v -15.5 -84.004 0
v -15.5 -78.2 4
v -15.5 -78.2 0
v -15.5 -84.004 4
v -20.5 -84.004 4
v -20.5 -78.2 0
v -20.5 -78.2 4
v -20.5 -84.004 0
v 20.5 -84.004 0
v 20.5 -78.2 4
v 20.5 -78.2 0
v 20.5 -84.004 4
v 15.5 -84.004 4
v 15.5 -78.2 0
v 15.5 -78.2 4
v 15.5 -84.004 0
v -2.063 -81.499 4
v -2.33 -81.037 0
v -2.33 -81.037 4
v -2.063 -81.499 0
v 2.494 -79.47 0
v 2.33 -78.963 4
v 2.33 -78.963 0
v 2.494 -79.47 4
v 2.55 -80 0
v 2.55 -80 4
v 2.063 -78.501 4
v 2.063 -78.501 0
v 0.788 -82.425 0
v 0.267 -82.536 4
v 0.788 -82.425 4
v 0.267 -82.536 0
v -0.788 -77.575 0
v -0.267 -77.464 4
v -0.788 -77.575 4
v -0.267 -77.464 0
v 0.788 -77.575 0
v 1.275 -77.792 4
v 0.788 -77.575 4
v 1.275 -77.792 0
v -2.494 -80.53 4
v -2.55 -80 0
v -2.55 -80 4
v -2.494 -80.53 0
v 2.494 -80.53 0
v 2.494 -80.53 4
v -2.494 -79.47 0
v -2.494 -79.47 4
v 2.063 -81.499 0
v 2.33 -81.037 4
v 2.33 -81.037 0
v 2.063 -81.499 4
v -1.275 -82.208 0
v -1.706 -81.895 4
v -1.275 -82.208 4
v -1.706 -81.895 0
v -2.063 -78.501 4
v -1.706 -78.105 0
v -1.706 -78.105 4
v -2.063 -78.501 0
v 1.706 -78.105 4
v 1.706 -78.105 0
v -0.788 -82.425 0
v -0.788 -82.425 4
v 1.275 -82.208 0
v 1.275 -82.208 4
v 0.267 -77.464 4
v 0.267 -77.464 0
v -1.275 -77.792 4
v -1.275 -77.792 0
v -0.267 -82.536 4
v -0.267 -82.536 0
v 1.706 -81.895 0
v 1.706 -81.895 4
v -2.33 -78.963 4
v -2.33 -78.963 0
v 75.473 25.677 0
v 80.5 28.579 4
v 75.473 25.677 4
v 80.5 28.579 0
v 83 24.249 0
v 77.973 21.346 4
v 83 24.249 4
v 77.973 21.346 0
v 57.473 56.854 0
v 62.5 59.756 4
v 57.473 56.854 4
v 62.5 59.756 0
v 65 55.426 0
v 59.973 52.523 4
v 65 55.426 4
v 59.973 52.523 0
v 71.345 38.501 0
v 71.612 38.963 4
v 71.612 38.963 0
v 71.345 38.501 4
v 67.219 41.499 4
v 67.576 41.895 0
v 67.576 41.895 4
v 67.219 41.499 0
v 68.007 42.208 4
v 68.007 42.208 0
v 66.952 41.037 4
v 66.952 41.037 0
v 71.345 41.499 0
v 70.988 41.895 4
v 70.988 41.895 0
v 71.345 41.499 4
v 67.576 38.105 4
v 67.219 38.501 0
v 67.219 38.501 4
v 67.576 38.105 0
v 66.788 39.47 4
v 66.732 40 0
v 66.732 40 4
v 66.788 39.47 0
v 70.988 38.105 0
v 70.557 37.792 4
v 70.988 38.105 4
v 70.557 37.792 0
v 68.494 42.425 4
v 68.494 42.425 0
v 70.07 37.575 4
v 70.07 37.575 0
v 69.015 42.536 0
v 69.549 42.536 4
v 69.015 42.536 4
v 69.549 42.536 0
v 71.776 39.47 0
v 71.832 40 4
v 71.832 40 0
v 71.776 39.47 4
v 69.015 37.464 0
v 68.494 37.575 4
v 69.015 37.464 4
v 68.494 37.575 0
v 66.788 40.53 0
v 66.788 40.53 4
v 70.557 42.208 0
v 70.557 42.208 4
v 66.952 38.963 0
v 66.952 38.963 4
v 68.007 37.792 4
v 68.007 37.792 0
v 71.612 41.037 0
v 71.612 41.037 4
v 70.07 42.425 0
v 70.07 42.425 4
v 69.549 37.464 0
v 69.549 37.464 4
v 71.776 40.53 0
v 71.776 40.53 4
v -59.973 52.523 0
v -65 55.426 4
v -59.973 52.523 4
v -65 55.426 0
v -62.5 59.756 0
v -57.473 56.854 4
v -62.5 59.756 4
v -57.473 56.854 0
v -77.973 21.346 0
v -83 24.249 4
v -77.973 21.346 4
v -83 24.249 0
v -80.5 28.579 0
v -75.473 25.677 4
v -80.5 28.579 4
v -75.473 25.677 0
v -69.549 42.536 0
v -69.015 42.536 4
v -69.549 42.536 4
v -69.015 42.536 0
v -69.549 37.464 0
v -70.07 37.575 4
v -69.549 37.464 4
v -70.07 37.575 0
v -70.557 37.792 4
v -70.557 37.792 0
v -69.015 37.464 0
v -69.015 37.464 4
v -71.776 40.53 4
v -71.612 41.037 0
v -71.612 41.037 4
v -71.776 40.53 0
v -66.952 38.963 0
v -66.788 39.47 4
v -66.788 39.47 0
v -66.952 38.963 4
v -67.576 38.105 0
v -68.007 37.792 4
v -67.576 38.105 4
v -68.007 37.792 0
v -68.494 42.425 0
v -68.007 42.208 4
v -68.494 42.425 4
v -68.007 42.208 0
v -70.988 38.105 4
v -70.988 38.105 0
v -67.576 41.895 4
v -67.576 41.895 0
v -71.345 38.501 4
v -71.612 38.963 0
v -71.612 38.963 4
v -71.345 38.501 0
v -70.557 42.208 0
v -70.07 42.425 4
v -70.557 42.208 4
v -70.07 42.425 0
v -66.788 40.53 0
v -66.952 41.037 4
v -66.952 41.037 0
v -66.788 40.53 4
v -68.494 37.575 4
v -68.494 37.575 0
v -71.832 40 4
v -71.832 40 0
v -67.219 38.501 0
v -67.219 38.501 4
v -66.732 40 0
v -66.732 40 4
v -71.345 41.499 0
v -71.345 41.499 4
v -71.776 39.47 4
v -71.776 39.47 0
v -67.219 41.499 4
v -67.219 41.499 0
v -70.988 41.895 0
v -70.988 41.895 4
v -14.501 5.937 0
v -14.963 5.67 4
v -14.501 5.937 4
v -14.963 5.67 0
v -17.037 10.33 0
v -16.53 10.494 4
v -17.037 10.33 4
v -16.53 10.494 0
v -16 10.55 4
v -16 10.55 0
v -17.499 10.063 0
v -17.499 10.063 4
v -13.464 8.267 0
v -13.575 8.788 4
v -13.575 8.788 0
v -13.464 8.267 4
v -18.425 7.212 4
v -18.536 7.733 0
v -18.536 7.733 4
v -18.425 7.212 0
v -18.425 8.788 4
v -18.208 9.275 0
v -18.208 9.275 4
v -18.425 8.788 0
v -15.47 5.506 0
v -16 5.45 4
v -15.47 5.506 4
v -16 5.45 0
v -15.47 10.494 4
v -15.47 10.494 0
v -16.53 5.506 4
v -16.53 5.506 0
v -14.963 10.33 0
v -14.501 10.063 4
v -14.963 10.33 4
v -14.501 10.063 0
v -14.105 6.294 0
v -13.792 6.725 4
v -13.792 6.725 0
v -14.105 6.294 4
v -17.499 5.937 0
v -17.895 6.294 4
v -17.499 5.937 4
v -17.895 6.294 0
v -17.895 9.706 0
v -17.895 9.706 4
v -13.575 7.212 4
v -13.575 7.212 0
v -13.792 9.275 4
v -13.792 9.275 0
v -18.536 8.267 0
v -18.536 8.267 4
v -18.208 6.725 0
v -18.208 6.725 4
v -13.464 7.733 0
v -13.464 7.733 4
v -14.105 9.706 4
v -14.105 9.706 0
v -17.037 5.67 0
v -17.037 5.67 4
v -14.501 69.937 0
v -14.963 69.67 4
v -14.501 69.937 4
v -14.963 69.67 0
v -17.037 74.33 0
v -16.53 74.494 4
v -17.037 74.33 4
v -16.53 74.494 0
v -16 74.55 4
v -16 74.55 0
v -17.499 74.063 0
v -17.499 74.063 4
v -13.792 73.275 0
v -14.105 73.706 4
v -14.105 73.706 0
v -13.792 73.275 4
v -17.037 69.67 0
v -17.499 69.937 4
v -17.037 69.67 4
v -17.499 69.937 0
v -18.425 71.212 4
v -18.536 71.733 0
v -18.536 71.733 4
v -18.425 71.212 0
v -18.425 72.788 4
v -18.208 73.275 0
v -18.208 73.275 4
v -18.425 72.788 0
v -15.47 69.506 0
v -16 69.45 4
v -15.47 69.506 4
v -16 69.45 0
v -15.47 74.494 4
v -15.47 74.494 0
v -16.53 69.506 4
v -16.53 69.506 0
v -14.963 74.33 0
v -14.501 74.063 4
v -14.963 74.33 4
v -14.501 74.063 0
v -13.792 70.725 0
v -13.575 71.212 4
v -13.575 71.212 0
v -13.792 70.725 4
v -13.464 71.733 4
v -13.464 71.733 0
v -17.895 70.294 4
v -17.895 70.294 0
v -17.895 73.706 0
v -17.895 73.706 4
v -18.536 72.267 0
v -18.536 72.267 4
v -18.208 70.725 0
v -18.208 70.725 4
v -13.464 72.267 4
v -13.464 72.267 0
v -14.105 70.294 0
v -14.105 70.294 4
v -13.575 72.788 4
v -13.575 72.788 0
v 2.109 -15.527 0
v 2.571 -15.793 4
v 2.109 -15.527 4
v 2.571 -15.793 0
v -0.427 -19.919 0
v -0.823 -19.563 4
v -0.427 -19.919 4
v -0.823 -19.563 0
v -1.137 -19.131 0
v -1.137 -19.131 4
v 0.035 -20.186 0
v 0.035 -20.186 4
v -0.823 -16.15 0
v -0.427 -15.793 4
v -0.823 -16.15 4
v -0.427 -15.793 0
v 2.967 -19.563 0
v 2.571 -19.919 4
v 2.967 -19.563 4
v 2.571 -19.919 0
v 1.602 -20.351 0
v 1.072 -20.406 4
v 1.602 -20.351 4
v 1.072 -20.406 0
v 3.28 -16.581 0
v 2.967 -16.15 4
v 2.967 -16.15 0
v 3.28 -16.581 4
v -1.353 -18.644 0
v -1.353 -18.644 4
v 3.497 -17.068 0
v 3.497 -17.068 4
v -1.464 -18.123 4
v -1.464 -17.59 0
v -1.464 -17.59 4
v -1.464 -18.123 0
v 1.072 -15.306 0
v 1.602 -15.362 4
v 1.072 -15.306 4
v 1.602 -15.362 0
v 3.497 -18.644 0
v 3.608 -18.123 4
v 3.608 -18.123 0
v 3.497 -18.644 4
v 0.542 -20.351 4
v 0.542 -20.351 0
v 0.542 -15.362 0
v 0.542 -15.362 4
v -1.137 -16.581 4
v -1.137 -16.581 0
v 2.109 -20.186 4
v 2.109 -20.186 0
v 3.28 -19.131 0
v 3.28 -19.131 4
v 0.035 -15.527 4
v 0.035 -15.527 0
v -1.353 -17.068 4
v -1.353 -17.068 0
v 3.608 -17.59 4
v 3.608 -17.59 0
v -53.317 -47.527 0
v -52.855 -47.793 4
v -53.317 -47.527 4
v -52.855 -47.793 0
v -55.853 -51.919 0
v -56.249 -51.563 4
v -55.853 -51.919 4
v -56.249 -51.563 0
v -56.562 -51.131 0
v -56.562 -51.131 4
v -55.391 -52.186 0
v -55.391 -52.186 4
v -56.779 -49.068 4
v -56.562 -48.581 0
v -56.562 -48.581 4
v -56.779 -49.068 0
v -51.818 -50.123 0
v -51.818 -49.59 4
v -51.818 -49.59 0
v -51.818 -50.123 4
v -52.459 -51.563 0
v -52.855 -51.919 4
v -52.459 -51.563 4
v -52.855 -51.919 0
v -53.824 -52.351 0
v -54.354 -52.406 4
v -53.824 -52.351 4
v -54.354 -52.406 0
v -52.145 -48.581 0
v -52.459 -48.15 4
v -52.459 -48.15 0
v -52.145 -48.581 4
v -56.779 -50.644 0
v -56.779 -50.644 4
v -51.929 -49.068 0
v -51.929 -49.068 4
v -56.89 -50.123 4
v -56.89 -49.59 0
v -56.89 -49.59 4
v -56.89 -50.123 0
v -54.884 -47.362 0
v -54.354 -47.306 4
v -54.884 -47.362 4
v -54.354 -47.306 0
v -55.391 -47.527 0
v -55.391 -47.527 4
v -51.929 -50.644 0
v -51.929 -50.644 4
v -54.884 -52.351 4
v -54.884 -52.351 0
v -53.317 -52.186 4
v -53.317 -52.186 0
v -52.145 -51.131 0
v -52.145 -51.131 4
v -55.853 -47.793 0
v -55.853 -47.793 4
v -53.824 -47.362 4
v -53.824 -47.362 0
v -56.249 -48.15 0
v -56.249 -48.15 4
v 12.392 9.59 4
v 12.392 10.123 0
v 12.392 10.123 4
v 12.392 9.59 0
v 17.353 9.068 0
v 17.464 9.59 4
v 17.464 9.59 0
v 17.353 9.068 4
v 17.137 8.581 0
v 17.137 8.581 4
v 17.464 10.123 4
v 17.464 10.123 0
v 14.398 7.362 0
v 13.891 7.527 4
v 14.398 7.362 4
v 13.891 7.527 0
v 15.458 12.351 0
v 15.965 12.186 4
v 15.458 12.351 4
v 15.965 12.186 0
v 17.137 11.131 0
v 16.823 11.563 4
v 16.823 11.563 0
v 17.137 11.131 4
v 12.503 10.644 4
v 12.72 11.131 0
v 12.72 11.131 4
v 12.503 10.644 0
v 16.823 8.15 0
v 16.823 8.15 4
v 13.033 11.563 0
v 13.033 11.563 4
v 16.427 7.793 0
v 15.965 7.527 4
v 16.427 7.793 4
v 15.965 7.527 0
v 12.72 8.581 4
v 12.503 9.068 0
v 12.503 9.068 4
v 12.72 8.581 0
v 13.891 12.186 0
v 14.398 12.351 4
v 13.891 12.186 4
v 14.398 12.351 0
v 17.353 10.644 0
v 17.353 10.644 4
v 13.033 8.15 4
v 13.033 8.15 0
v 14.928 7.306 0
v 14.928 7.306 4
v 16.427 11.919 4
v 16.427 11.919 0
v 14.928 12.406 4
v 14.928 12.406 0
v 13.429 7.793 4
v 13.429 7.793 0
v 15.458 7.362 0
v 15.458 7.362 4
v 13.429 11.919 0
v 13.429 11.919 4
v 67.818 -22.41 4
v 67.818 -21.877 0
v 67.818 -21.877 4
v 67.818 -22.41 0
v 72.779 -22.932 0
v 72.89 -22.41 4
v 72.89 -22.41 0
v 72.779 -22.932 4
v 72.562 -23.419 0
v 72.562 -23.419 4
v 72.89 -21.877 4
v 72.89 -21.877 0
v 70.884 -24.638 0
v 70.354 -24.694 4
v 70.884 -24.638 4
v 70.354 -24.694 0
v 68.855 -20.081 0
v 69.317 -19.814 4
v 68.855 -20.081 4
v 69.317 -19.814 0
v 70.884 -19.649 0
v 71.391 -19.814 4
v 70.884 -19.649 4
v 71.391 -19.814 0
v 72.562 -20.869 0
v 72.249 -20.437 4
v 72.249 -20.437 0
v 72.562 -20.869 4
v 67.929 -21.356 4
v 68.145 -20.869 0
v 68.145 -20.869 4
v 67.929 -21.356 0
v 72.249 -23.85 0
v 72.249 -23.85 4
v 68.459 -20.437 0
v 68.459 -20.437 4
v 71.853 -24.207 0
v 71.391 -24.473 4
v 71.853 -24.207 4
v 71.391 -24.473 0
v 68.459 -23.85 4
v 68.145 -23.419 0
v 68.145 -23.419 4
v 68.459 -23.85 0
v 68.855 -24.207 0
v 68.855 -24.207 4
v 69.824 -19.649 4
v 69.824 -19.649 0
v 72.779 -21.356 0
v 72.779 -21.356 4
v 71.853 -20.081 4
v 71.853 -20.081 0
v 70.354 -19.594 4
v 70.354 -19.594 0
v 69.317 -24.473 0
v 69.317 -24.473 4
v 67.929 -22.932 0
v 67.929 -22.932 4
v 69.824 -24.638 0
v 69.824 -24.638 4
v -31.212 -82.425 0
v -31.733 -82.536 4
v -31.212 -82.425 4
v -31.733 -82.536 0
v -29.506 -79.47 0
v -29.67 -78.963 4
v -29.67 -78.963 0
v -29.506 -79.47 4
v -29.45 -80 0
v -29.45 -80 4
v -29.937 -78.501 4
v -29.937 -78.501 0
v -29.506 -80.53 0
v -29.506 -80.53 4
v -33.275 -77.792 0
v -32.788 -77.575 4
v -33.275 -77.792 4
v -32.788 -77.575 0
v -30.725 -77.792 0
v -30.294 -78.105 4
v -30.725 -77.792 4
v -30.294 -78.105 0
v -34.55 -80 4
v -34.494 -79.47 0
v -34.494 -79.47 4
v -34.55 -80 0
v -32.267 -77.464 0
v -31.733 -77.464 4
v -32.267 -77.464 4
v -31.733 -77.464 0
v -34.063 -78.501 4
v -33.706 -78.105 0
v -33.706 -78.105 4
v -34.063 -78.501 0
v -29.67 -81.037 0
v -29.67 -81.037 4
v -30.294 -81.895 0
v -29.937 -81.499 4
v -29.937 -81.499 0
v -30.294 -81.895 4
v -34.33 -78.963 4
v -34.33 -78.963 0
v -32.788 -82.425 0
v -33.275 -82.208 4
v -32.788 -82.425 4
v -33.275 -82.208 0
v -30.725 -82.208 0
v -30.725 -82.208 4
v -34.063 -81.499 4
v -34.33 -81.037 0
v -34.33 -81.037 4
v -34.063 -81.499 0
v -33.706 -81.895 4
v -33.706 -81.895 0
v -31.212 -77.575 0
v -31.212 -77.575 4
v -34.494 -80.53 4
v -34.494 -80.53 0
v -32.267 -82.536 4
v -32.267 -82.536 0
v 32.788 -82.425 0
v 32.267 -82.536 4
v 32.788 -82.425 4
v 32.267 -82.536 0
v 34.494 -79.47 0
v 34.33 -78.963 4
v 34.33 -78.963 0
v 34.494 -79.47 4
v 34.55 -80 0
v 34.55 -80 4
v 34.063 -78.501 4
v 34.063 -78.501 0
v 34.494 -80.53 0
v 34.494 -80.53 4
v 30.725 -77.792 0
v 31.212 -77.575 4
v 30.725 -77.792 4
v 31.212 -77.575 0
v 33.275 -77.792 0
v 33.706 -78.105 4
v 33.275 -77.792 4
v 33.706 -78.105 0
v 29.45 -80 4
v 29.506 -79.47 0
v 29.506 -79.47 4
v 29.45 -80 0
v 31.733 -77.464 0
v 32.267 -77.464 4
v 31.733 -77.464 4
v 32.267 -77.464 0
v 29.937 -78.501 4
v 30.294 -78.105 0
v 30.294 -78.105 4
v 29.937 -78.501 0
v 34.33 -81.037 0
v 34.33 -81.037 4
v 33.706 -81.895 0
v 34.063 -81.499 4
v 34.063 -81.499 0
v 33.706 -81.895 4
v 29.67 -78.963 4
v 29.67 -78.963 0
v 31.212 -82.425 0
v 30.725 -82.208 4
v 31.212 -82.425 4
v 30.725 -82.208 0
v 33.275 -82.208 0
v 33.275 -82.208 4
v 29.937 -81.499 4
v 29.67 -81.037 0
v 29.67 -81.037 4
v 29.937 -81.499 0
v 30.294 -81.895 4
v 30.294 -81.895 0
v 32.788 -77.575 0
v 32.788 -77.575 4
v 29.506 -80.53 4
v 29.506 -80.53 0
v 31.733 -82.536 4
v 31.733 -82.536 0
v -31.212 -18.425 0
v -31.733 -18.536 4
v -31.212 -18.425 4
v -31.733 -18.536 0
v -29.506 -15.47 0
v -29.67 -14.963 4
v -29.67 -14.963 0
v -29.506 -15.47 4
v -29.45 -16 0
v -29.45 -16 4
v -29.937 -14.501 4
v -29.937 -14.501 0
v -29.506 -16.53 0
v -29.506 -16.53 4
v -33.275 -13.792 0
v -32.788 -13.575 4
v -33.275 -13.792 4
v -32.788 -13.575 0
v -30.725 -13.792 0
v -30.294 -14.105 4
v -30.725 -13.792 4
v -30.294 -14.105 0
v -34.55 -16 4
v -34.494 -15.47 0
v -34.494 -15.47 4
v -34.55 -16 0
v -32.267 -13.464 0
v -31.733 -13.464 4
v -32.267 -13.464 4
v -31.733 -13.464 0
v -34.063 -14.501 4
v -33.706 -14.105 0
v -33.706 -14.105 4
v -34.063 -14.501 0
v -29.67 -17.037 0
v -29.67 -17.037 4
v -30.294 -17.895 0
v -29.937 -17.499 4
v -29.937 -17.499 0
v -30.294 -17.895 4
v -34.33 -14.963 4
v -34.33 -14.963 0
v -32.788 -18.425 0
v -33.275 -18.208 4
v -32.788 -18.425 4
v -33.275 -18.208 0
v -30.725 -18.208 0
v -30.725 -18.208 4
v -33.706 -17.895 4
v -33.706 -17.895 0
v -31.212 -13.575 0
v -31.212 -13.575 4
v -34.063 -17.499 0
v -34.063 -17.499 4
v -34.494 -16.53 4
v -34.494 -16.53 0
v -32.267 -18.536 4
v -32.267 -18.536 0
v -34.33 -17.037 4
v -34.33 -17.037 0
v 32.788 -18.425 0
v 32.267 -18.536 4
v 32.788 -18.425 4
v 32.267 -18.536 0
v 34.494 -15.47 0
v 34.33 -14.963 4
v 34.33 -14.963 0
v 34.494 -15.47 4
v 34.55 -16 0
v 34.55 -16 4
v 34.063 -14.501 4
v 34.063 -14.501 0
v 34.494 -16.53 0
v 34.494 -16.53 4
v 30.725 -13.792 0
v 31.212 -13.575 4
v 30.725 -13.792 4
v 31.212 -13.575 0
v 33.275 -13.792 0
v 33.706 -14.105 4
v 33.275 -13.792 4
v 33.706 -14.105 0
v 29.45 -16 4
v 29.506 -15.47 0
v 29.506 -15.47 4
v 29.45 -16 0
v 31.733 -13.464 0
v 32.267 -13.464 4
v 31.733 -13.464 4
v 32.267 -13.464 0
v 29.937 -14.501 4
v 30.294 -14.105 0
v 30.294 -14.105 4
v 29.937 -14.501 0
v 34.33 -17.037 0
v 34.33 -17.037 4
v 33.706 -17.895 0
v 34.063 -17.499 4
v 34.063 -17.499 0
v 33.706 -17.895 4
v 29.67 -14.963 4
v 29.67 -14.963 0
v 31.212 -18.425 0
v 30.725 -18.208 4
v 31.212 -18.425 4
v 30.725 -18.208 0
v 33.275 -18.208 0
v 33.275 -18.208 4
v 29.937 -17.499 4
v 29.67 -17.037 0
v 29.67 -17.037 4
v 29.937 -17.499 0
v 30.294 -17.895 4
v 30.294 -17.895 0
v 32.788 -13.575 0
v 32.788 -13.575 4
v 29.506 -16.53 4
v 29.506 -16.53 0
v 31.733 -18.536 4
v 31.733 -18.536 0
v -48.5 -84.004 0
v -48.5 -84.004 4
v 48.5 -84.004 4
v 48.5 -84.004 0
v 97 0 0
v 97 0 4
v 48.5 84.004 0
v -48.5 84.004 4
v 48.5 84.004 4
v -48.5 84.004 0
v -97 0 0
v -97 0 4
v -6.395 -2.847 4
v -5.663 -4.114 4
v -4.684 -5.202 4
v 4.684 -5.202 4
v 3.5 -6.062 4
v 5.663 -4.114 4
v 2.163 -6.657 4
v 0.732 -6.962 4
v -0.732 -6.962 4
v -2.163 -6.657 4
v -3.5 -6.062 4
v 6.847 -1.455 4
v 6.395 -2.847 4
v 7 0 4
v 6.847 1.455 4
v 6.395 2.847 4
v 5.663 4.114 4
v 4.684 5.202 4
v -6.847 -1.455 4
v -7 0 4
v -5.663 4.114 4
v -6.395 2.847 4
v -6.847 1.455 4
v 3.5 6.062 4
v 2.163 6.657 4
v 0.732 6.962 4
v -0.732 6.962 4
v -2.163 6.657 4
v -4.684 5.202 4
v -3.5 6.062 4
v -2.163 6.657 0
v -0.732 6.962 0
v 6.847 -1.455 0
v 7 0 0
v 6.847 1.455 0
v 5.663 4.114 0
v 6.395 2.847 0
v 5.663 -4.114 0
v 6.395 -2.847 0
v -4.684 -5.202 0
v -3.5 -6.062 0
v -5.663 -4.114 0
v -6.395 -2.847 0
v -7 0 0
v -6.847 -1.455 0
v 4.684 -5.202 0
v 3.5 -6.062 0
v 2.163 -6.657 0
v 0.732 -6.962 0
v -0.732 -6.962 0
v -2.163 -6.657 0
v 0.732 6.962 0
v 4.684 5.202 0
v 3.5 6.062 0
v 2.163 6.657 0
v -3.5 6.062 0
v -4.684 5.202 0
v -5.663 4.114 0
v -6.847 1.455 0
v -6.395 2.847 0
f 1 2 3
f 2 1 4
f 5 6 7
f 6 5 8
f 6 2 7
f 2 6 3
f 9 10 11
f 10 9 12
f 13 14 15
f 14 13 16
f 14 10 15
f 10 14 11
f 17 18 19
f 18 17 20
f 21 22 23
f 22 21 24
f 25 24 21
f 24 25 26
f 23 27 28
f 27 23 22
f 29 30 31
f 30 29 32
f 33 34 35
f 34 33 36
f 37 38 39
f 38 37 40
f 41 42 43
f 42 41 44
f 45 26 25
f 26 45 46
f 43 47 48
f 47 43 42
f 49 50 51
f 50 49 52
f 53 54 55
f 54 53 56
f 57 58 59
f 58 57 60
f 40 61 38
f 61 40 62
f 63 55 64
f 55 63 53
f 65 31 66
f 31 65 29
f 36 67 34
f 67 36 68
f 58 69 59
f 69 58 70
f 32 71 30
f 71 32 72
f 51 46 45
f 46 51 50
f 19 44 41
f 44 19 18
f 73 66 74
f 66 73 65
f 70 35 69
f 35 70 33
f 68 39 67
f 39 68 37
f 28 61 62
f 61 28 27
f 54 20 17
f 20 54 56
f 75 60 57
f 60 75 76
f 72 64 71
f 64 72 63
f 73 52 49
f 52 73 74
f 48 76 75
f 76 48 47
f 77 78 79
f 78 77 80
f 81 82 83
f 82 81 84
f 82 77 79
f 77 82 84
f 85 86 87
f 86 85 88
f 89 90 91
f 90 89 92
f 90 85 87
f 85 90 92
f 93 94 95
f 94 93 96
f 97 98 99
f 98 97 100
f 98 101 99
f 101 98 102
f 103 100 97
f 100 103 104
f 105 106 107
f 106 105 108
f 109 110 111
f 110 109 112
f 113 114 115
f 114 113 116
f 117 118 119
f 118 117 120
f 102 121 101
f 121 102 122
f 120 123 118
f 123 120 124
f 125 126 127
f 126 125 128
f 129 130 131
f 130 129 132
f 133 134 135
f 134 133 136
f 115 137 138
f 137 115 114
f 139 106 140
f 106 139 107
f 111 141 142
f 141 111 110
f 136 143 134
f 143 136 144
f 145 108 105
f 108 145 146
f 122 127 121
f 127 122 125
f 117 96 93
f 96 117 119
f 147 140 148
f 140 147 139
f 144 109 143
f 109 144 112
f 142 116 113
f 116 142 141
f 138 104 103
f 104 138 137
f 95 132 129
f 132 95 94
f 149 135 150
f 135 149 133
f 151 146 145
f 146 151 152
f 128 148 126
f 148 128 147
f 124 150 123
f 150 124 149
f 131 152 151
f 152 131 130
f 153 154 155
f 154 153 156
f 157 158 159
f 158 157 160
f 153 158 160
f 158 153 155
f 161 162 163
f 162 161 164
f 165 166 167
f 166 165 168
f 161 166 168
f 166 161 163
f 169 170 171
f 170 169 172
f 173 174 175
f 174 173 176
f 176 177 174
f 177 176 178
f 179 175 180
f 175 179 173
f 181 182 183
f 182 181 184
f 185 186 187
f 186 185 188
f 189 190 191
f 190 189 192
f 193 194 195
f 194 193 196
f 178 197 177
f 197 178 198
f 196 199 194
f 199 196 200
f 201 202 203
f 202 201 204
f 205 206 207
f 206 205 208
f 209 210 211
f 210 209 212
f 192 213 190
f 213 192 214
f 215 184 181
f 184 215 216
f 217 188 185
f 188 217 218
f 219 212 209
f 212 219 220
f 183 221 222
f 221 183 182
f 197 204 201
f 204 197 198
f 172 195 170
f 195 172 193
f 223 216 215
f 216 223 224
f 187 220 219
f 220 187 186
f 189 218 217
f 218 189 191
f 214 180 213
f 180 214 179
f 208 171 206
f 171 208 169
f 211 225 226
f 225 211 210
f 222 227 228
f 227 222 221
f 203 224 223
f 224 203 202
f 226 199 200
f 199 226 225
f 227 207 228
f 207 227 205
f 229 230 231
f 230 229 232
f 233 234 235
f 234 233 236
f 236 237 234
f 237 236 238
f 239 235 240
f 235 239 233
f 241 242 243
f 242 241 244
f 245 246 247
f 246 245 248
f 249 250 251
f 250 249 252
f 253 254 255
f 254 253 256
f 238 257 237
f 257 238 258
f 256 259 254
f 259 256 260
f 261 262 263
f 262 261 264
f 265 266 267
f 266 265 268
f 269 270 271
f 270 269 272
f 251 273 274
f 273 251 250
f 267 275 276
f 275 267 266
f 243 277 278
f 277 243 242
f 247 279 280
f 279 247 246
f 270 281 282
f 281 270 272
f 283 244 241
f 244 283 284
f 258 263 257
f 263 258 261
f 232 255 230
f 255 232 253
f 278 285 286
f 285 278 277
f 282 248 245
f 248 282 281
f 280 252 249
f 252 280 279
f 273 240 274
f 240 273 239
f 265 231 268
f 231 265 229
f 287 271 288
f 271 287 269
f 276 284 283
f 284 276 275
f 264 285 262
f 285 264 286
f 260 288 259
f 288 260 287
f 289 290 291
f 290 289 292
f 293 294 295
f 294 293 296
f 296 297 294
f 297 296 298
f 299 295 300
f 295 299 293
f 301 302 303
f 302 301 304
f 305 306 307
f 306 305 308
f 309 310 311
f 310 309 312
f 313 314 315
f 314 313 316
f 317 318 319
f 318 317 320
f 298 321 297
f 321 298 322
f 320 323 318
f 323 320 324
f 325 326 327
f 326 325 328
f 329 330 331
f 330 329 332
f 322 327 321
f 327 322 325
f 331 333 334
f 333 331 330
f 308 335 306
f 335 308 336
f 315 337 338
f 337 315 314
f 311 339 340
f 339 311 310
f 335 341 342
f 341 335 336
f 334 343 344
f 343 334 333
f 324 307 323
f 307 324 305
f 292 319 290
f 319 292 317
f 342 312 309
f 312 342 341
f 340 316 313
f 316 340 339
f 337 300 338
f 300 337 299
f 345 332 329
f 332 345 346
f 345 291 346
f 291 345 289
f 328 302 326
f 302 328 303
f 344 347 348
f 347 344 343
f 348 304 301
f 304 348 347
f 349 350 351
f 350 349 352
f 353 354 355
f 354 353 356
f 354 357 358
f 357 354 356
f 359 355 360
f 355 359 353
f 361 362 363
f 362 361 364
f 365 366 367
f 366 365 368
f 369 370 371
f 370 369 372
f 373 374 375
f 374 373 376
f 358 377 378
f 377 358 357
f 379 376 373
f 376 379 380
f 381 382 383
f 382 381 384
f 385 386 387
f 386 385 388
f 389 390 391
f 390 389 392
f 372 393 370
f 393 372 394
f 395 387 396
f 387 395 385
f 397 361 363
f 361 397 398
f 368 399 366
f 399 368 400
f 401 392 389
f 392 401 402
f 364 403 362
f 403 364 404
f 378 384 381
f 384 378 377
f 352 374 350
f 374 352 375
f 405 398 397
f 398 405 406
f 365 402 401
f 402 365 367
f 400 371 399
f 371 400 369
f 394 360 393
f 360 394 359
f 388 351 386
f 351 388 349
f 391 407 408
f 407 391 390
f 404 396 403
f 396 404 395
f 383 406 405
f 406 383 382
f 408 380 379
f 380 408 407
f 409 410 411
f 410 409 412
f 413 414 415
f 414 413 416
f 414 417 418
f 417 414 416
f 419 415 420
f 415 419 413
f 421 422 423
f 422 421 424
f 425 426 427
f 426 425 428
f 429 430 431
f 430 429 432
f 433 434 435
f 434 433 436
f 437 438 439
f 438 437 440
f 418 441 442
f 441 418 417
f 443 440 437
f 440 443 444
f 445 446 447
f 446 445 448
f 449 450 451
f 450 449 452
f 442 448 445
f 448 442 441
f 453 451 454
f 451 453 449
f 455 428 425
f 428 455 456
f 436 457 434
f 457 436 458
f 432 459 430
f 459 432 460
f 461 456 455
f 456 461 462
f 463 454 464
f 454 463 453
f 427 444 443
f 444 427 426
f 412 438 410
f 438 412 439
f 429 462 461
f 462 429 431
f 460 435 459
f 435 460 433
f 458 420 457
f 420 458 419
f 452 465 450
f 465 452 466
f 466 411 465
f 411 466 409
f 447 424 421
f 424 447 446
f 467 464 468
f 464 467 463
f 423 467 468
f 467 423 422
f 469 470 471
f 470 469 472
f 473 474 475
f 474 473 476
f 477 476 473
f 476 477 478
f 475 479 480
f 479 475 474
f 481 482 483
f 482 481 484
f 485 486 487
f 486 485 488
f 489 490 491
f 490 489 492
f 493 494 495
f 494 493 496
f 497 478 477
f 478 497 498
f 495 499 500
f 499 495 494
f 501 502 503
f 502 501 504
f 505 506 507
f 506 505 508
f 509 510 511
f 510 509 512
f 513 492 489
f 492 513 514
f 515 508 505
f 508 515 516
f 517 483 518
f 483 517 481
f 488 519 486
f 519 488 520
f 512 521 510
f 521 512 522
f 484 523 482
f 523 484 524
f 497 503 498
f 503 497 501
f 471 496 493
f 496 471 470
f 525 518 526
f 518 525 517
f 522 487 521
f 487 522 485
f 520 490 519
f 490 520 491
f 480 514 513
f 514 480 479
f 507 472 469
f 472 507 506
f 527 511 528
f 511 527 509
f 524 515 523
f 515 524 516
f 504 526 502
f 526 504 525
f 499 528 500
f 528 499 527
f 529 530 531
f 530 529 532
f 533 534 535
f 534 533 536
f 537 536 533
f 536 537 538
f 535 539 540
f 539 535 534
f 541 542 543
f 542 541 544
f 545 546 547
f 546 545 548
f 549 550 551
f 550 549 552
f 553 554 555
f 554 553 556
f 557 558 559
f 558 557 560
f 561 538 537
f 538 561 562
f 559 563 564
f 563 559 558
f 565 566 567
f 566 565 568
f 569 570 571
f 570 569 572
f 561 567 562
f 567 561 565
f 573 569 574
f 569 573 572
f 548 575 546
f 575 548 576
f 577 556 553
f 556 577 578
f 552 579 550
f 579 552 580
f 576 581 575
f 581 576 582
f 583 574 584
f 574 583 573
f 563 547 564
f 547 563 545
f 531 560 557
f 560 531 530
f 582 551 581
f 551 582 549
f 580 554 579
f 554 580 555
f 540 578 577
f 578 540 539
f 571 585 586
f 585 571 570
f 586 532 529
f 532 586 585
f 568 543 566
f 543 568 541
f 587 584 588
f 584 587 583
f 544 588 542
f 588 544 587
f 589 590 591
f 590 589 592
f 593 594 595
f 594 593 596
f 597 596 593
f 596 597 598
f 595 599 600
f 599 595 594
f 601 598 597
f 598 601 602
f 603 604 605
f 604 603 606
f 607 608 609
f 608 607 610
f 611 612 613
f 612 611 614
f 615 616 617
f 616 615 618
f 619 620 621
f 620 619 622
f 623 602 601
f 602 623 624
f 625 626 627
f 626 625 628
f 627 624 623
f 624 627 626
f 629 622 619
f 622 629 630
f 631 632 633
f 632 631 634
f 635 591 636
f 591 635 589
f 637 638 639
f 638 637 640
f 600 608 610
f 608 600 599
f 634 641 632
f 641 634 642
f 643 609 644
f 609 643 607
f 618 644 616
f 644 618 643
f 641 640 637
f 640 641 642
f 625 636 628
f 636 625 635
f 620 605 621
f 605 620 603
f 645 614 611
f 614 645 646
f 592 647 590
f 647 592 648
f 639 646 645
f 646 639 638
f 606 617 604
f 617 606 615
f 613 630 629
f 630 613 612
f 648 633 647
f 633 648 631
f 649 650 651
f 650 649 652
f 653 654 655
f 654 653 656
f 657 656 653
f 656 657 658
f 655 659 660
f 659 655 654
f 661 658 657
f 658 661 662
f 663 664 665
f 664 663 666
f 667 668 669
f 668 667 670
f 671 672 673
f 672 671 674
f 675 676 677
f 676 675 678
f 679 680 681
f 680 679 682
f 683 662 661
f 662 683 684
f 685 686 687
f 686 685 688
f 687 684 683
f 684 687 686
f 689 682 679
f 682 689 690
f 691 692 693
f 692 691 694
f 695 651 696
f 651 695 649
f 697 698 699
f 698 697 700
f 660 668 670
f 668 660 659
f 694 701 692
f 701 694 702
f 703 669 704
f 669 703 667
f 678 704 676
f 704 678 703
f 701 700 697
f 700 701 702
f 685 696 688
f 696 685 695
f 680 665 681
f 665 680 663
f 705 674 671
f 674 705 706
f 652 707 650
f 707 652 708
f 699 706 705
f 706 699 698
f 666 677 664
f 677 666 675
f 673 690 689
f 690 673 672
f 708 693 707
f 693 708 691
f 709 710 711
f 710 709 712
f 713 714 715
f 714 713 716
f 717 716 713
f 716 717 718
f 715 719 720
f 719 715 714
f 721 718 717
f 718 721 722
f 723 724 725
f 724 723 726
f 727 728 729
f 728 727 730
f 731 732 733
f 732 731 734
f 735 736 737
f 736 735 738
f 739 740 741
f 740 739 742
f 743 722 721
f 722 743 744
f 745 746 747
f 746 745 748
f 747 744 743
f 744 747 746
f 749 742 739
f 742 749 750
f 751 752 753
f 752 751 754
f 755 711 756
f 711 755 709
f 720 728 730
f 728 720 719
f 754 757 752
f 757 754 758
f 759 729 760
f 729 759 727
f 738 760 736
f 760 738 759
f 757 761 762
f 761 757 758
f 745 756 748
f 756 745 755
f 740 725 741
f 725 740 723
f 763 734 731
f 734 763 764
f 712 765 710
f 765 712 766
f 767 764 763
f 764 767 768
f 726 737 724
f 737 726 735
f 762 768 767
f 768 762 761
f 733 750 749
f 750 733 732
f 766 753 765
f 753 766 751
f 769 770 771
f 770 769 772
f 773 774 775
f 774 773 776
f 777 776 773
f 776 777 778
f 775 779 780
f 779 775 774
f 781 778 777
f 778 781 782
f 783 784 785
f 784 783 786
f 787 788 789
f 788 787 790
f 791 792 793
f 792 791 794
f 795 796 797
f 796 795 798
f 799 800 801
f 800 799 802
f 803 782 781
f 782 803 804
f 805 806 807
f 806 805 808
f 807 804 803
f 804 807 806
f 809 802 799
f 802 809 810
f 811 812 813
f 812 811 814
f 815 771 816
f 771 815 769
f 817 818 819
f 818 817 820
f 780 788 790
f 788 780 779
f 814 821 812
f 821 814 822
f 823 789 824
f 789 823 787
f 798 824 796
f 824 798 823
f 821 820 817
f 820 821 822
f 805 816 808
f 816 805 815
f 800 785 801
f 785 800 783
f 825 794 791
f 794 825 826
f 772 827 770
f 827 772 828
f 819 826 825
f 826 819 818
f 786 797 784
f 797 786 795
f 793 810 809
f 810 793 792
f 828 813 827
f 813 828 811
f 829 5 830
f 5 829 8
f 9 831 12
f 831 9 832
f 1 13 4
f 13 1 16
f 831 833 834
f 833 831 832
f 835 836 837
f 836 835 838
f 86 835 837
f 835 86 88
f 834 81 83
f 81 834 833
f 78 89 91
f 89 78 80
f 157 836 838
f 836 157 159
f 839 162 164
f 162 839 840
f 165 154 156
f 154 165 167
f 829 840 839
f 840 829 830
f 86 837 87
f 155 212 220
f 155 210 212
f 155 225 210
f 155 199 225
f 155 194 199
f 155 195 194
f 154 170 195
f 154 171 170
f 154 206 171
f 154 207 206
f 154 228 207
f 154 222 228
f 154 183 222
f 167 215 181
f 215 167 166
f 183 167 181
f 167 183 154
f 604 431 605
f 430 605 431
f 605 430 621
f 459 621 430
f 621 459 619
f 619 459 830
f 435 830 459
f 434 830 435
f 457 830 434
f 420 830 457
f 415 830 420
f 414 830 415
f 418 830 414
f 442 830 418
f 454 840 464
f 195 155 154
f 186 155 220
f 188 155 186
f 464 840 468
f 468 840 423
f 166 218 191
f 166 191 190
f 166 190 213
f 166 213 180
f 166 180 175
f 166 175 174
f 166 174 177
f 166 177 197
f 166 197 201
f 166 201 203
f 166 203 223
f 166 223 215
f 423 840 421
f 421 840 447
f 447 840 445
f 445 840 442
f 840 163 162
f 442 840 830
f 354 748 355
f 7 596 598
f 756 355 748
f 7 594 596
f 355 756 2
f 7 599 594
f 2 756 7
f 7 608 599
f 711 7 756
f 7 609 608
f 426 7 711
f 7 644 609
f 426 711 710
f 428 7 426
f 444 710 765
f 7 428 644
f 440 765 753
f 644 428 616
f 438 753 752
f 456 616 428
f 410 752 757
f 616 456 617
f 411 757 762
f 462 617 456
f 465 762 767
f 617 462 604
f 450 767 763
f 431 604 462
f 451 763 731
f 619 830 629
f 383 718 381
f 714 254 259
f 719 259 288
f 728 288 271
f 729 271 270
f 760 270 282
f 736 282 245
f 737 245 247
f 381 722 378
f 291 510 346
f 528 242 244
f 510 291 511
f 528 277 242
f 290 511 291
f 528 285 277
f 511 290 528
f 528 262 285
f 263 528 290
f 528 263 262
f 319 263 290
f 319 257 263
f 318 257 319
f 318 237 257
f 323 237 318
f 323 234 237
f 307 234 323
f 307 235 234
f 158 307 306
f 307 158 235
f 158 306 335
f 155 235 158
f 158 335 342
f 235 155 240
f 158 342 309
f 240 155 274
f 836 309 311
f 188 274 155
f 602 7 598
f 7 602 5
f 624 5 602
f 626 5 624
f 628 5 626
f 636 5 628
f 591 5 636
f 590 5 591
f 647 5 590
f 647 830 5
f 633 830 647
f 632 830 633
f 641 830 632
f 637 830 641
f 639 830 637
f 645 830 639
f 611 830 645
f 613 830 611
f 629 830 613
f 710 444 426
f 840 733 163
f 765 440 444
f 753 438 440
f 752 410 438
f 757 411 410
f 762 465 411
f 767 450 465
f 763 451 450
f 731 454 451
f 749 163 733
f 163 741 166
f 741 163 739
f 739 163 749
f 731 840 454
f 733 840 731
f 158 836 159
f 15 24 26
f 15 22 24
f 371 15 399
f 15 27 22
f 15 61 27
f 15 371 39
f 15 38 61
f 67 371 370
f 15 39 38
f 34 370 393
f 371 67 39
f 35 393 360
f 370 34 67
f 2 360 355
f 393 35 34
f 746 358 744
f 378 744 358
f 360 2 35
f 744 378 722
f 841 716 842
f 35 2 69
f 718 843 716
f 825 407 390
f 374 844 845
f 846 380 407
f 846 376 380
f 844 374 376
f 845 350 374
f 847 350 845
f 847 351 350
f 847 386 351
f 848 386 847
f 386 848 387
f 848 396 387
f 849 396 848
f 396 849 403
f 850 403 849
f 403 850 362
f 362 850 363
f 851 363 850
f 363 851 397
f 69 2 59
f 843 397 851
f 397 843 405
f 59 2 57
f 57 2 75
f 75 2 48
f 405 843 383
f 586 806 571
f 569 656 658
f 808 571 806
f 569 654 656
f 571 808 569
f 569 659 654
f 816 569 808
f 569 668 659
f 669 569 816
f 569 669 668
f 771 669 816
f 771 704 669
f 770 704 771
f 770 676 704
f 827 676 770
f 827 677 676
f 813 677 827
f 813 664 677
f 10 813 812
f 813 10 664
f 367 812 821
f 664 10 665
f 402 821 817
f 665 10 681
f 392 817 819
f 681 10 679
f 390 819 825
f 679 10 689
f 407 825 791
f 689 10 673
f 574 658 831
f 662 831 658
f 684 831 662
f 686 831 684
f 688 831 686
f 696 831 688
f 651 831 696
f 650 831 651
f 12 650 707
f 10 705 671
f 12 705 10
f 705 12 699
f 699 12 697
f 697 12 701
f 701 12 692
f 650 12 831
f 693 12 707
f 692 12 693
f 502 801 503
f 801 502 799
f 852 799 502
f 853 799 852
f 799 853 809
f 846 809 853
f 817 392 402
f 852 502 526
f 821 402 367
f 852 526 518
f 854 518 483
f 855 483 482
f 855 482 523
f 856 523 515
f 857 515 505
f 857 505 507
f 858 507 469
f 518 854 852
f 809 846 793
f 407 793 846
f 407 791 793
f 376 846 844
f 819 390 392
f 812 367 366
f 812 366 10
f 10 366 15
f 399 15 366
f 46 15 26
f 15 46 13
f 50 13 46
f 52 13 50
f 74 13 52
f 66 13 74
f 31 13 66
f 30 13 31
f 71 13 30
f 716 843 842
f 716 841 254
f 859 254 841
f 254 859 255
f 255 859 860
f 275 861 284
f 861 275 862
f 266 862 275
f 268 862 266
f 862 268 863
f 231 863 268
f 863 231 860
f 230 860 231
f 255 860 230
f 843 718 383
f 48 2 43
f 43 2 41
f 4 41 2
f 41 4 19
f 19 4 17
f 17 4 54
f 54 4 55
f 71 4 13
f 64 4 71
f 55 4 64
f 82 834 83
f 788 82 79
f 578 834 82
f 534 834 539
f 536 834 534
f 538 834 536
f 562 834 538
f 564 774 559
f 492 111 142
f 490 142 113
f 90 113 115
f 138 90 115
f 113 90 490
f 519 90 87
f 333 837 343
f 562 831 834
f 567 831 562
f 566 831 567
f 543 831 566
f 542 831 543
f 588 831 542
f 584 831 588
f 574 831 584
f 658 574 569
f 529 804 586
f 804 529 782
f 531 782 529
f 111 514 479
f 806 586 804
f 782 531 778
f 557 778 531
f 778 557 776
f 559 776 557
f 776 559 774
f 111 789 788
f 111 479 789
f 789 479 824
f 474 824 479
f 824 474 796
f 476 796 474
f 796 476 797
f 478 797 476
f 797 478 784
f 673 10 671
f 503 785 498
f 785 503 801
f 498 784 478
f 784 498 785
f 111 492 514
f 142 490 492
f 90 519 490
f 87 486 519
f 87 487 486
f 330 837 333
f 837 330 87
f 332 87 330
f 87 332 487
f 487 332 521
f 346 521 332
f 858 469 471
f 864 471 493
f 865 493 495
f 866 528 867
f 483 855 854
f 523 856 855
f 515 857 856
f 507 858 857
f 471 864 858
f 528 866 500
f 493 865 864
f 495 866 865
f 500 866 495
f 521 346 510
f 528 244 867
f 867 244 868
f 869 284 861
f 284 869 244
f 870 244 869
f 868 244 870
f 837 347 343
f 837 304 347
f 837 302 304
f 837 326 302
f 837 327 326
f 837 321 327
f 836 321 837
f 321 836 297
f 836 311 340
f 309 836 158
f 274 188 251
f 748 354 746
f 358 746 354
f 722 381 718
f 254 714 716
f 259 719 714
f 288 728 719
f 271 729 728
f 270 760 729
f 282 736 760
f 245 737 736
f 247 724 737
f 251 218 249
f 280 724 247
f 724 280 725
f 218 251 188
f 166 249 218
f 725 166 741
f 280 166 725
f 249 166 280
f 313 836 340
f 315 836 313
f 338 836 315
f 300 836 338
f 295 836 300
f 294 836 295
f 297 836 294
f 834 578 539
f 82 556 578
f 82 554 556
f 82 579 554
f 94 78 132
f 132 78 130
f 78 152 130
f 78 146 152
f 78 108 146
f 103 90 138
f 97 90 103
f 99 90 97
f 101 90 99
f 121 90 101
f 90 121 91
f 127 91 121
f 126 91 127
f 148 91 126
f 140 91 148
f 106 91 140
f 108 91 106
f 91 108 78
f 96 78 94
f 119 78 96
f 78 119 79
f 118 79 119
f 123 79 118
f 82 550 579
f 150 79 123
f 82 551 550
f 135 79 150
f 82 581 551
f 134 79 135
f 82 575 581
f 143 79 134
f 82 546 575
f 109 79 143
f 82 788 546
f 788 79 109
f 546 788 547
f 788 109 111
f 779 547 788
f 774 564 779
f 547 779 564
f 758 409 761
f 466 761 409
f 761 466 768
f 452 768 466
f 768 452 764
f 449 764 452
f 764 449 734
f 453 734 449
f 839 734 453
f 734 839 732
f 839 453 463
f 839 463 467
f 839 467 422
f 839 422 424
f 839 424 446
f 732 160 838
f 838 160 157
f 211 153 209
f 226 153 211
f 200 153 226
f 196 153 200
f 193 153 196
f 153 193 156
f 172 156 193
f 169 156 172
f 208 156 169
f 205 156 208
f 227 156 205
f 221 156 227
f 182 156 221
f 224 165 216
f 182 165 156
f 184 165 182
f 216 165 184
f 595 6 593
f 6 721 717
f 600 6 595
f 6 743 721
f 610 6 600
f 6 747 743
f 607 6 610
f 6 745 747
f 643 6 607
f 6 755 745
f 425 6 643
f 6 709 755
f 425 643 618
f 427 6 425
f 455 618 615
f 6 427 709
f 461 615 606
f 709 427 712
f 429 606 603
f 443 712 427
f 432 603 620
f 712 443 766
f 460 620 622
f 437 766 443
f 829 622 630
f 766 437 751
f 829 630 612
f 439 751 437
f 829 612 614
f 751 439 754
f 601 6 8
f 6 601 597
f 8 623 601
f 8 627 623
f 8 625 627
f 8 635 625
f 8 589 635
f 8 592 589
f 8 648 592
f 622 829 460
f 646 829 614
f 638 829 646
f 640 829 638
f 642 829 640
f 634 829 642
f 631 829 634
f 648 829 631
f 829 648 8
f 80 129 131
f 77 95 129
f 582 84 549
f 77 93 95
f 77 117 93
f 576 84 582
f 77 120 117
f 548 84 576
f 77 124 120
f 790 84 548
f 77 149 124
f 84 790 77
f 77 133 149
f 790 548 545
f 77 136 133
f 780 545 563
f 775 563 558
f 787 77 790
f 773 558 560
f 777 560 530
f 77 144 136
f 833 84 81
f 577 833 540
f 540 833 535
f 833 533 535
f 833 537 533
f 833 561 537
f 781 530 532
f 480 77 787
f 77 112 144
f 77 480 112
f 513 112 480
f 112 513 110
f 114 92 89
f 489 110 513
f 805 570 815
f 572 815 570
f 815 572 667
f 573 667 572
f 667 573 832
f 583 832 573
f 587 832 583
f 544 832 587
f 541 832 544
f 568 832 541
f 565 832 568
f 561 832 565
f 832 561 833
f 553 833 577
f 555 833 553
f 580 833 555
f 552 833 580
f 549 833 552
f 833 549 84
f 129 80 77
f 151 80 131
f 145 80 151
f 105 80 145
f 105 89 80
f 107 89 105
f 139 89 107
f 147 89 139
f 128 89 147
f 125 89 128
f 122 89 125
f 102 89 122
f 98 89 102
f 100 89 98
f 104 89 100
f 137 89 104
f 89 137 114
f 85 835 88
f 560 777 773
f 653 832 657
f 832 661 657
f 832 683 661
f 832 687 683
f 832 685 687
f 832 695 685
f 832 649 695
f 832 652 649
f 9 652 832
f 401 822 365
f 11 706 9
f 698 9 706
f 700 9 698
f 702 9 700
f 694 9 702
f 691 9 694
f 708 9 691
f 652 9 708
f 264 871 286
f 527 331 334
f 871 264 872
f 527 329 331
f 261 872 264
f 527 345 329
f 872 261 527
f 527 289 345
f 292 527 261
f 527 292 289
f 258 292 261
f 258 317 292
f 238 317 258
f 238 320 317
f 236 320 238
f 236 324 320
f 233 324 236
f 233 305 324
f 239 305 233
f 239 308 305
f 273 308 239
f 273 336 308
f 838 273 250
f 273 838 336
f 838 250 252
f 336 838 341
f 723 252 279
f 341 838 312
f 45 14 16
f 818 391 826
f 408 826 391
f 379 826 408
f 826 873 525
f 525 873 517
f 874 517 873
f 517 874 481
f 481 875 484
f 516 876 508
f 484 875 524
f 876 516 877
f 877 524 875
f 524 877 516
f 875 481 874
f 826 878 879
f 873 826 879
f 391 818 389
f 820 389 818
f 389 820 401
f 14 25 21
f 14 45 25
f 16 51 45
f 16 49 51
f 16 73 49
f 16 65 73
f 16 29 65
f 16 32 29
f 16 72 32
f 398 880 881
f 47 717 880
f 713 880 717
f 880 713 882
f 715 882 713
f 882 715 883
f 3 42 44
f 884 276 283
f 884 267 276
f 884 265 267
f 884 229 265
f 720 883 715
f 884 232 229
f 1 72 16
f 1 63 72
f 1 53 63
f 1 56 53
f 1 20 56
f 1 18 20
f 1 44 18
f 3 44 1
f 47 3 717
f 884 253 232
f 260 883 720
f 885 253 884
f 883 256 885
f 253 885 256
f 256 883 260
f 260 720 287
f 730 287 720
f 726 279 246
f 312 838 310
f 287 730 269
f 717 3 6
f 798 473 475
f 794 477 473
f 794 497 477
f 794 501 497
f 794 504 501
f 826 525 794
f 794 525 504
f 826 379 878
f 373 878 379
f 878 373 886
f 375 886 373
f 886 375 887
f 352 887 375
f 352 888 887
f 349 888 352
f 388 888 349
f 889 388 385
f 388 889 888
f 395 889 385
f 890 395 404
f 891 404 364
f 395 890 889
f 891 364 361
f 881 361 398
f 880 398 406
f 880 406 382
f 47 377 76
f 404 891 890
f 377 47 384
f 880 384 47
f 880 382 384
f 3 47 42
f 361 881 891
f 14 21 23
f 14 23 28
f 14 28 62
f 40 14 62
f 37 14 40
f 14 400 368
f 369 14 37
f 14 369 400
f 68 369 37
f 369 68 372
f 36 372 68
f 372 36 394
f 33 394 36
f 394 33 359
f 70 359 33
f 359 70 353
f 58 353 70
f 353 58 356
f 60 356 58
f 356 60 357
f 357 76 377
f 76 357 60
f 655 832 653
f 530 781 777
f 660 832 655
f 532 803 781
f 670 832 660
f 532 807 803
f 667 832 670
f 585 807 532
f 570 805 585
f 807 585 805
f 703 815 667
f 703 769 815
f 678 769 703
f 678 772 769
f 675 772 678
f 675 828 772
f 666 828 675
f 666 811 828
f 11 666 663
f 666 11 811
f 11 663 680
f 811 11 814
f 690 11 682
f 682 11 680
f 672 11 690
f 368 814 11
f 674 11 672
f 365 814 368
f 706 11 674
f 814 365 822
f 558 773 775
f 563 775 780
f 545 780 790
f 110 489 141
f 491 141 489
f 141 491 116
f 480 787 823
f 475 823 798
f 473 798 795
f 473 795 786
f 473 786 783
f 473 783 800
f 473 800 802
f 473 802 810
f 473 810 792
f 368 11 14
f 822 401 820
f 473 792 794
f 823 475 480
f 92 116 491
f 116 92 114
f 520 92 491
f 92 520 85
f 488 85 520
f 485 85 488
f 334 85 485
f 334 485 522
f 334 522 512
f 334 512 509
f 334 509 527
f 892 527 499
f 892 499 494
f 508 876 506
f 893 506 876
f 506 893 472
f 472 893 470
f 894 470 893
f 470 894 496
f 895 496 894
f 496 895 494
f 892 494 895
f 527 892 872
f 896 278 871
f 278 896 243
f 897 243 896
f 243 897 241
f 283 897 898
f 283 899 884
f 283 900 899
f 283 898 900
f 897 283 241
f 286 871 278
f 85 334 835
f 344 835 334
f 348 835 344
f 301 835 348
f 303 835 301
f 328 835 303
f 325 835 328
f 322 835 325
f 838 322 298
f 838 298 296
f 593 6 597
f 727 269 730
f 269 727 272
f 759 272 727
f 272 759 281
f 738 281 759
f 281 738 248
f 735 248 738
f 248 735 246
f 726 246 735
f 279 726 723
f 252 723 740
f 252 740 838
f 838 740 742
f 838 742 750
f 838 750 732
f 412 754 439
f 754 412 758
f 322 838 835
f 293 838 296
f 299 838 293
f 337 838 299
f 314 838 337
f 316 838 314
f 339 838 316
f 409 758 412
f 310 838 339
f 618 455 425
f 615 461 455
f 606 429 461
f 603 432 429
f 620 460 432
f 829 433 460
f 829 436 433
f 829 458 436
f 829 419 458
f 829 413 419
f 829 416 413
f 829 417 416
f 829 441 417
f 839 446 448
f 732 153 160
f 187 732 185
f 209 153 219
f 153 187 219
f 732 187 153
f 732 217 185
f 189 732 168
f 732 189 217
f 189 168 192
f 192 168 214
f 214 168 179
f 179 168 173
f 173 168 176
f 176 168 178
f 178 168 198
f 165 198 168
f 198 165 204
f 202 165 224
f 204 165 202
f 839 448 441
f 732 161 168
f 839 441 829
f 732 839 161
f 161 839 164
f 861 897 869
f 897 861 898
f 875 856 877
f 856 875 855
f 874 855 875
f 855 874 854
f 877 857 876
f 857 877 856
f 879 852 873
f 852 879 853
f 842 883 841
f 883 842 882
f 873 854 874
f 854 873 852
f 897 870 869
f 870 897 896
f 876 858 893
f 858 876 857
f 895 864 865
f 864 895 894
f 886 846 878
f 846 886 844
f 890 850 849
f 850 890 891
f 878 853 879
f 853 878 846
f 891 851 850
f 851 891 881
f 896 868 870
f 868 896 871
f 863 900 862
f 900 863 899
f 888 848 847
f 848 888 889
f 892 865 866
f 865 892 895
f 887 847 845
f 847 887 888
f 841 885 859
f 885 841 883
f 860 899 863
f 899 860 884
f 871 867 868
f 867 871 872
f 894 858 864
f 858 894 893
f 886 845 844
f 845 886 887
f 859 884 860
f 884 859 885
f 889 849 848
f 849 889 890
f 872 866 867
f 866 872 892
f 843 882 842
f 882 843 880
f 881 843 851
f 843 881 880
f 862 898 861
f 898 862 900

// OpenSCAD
beam_width    = 8;
hole_diameter = 5.1;
hole_radius   = hole_diameter / 2;

module beam(number_of_holes, step=8) {
    beam_length = number_of_holes * 8;
        // Cut the holes
        for (x=[4 : step : beam_length]) {
            translate([x-4,0,2])
            cylinder(r=2.55, h=12, $fn=30);
        }
}


module joint(){
    // 8mmの部材を使うところを6mmに変更した
    side_thickness = 6.8; // 9.1 
    translate([-20.5,-85,-4])
    cube([5,side_thickness,20]);

    translate([15.5,-85,-4])
    cube([5,side_thickness,20]);

    translate([0,-beam_width*10,-10])
    cylinder(r=hole_radius, h=25, $fn=30);
}

module side_connectors() {
    joint();
    
    rotate(120)
    joint();
    
    rotate(240)
    joint();
}



// Uncomment 'projection' to create 2D (DXF-able) version
//projection(cut=true) {
union(){
    difference(){

        // Base plate
        //cube([8*9, beam_width * 9, 4]);
        // 半径97mmの六角形
        cylinder(r=beam_width*12+1, h=4, $fn=6);

        // Center hole
        translate([0,0,-2]) 
        cylinder(r=7, h=8, $fn=30);

        // Delta-bot leg mounting holes
        //translate([36,36,-5]) 
        translate([0,0,-5])
        side_connectors();
        
        rotate(90)
        translate([0,0,-5])
        center_connectors();

        rotate(0)
        translate([0,-8*6,0])
        box();
    }

    //translate([-4.5*beam_width,-10.5*beam_width,3])
    //cube([9*beam_width, 9*beam_width, 2]);
   
    rotate([0,0,180])
    translate([0,-50,4])
    linear_extrude(center=true, height=4) import("tapster.dxf");
}
//}


module box() {
        // Bottom row
        translate([-beam_width * 5,-beam_width*5+4,0])
        for (x=[8 :  beam_width * 8 : beam_width * 9]) {
            translate([x, beam_width/2, -10])
            cylinder(r=2.55, h=20, $fn=30);
        }
    
        // Top row
        translate([-beam_width * 5,-beam_width*4-4,0])
        for (x=[8 : beam_width * 8 : beam_width * 9]) {
            translate([x, (beam_width/2) + beam_width * 8, -10])
            cylinder(r=2.55, h=20, $fn=30);
       }
}

module center_connectors() {
    translate([8,16,0])
    rotate(a=0)
    beam(10,step=8*8);
    

    rotate(a=120)
    translate([8,16,0])
    beam(10,step=8*8);
    

    rotate(a=240)
    translate([8,16,0])
    beam(10,step=8*8);
}
